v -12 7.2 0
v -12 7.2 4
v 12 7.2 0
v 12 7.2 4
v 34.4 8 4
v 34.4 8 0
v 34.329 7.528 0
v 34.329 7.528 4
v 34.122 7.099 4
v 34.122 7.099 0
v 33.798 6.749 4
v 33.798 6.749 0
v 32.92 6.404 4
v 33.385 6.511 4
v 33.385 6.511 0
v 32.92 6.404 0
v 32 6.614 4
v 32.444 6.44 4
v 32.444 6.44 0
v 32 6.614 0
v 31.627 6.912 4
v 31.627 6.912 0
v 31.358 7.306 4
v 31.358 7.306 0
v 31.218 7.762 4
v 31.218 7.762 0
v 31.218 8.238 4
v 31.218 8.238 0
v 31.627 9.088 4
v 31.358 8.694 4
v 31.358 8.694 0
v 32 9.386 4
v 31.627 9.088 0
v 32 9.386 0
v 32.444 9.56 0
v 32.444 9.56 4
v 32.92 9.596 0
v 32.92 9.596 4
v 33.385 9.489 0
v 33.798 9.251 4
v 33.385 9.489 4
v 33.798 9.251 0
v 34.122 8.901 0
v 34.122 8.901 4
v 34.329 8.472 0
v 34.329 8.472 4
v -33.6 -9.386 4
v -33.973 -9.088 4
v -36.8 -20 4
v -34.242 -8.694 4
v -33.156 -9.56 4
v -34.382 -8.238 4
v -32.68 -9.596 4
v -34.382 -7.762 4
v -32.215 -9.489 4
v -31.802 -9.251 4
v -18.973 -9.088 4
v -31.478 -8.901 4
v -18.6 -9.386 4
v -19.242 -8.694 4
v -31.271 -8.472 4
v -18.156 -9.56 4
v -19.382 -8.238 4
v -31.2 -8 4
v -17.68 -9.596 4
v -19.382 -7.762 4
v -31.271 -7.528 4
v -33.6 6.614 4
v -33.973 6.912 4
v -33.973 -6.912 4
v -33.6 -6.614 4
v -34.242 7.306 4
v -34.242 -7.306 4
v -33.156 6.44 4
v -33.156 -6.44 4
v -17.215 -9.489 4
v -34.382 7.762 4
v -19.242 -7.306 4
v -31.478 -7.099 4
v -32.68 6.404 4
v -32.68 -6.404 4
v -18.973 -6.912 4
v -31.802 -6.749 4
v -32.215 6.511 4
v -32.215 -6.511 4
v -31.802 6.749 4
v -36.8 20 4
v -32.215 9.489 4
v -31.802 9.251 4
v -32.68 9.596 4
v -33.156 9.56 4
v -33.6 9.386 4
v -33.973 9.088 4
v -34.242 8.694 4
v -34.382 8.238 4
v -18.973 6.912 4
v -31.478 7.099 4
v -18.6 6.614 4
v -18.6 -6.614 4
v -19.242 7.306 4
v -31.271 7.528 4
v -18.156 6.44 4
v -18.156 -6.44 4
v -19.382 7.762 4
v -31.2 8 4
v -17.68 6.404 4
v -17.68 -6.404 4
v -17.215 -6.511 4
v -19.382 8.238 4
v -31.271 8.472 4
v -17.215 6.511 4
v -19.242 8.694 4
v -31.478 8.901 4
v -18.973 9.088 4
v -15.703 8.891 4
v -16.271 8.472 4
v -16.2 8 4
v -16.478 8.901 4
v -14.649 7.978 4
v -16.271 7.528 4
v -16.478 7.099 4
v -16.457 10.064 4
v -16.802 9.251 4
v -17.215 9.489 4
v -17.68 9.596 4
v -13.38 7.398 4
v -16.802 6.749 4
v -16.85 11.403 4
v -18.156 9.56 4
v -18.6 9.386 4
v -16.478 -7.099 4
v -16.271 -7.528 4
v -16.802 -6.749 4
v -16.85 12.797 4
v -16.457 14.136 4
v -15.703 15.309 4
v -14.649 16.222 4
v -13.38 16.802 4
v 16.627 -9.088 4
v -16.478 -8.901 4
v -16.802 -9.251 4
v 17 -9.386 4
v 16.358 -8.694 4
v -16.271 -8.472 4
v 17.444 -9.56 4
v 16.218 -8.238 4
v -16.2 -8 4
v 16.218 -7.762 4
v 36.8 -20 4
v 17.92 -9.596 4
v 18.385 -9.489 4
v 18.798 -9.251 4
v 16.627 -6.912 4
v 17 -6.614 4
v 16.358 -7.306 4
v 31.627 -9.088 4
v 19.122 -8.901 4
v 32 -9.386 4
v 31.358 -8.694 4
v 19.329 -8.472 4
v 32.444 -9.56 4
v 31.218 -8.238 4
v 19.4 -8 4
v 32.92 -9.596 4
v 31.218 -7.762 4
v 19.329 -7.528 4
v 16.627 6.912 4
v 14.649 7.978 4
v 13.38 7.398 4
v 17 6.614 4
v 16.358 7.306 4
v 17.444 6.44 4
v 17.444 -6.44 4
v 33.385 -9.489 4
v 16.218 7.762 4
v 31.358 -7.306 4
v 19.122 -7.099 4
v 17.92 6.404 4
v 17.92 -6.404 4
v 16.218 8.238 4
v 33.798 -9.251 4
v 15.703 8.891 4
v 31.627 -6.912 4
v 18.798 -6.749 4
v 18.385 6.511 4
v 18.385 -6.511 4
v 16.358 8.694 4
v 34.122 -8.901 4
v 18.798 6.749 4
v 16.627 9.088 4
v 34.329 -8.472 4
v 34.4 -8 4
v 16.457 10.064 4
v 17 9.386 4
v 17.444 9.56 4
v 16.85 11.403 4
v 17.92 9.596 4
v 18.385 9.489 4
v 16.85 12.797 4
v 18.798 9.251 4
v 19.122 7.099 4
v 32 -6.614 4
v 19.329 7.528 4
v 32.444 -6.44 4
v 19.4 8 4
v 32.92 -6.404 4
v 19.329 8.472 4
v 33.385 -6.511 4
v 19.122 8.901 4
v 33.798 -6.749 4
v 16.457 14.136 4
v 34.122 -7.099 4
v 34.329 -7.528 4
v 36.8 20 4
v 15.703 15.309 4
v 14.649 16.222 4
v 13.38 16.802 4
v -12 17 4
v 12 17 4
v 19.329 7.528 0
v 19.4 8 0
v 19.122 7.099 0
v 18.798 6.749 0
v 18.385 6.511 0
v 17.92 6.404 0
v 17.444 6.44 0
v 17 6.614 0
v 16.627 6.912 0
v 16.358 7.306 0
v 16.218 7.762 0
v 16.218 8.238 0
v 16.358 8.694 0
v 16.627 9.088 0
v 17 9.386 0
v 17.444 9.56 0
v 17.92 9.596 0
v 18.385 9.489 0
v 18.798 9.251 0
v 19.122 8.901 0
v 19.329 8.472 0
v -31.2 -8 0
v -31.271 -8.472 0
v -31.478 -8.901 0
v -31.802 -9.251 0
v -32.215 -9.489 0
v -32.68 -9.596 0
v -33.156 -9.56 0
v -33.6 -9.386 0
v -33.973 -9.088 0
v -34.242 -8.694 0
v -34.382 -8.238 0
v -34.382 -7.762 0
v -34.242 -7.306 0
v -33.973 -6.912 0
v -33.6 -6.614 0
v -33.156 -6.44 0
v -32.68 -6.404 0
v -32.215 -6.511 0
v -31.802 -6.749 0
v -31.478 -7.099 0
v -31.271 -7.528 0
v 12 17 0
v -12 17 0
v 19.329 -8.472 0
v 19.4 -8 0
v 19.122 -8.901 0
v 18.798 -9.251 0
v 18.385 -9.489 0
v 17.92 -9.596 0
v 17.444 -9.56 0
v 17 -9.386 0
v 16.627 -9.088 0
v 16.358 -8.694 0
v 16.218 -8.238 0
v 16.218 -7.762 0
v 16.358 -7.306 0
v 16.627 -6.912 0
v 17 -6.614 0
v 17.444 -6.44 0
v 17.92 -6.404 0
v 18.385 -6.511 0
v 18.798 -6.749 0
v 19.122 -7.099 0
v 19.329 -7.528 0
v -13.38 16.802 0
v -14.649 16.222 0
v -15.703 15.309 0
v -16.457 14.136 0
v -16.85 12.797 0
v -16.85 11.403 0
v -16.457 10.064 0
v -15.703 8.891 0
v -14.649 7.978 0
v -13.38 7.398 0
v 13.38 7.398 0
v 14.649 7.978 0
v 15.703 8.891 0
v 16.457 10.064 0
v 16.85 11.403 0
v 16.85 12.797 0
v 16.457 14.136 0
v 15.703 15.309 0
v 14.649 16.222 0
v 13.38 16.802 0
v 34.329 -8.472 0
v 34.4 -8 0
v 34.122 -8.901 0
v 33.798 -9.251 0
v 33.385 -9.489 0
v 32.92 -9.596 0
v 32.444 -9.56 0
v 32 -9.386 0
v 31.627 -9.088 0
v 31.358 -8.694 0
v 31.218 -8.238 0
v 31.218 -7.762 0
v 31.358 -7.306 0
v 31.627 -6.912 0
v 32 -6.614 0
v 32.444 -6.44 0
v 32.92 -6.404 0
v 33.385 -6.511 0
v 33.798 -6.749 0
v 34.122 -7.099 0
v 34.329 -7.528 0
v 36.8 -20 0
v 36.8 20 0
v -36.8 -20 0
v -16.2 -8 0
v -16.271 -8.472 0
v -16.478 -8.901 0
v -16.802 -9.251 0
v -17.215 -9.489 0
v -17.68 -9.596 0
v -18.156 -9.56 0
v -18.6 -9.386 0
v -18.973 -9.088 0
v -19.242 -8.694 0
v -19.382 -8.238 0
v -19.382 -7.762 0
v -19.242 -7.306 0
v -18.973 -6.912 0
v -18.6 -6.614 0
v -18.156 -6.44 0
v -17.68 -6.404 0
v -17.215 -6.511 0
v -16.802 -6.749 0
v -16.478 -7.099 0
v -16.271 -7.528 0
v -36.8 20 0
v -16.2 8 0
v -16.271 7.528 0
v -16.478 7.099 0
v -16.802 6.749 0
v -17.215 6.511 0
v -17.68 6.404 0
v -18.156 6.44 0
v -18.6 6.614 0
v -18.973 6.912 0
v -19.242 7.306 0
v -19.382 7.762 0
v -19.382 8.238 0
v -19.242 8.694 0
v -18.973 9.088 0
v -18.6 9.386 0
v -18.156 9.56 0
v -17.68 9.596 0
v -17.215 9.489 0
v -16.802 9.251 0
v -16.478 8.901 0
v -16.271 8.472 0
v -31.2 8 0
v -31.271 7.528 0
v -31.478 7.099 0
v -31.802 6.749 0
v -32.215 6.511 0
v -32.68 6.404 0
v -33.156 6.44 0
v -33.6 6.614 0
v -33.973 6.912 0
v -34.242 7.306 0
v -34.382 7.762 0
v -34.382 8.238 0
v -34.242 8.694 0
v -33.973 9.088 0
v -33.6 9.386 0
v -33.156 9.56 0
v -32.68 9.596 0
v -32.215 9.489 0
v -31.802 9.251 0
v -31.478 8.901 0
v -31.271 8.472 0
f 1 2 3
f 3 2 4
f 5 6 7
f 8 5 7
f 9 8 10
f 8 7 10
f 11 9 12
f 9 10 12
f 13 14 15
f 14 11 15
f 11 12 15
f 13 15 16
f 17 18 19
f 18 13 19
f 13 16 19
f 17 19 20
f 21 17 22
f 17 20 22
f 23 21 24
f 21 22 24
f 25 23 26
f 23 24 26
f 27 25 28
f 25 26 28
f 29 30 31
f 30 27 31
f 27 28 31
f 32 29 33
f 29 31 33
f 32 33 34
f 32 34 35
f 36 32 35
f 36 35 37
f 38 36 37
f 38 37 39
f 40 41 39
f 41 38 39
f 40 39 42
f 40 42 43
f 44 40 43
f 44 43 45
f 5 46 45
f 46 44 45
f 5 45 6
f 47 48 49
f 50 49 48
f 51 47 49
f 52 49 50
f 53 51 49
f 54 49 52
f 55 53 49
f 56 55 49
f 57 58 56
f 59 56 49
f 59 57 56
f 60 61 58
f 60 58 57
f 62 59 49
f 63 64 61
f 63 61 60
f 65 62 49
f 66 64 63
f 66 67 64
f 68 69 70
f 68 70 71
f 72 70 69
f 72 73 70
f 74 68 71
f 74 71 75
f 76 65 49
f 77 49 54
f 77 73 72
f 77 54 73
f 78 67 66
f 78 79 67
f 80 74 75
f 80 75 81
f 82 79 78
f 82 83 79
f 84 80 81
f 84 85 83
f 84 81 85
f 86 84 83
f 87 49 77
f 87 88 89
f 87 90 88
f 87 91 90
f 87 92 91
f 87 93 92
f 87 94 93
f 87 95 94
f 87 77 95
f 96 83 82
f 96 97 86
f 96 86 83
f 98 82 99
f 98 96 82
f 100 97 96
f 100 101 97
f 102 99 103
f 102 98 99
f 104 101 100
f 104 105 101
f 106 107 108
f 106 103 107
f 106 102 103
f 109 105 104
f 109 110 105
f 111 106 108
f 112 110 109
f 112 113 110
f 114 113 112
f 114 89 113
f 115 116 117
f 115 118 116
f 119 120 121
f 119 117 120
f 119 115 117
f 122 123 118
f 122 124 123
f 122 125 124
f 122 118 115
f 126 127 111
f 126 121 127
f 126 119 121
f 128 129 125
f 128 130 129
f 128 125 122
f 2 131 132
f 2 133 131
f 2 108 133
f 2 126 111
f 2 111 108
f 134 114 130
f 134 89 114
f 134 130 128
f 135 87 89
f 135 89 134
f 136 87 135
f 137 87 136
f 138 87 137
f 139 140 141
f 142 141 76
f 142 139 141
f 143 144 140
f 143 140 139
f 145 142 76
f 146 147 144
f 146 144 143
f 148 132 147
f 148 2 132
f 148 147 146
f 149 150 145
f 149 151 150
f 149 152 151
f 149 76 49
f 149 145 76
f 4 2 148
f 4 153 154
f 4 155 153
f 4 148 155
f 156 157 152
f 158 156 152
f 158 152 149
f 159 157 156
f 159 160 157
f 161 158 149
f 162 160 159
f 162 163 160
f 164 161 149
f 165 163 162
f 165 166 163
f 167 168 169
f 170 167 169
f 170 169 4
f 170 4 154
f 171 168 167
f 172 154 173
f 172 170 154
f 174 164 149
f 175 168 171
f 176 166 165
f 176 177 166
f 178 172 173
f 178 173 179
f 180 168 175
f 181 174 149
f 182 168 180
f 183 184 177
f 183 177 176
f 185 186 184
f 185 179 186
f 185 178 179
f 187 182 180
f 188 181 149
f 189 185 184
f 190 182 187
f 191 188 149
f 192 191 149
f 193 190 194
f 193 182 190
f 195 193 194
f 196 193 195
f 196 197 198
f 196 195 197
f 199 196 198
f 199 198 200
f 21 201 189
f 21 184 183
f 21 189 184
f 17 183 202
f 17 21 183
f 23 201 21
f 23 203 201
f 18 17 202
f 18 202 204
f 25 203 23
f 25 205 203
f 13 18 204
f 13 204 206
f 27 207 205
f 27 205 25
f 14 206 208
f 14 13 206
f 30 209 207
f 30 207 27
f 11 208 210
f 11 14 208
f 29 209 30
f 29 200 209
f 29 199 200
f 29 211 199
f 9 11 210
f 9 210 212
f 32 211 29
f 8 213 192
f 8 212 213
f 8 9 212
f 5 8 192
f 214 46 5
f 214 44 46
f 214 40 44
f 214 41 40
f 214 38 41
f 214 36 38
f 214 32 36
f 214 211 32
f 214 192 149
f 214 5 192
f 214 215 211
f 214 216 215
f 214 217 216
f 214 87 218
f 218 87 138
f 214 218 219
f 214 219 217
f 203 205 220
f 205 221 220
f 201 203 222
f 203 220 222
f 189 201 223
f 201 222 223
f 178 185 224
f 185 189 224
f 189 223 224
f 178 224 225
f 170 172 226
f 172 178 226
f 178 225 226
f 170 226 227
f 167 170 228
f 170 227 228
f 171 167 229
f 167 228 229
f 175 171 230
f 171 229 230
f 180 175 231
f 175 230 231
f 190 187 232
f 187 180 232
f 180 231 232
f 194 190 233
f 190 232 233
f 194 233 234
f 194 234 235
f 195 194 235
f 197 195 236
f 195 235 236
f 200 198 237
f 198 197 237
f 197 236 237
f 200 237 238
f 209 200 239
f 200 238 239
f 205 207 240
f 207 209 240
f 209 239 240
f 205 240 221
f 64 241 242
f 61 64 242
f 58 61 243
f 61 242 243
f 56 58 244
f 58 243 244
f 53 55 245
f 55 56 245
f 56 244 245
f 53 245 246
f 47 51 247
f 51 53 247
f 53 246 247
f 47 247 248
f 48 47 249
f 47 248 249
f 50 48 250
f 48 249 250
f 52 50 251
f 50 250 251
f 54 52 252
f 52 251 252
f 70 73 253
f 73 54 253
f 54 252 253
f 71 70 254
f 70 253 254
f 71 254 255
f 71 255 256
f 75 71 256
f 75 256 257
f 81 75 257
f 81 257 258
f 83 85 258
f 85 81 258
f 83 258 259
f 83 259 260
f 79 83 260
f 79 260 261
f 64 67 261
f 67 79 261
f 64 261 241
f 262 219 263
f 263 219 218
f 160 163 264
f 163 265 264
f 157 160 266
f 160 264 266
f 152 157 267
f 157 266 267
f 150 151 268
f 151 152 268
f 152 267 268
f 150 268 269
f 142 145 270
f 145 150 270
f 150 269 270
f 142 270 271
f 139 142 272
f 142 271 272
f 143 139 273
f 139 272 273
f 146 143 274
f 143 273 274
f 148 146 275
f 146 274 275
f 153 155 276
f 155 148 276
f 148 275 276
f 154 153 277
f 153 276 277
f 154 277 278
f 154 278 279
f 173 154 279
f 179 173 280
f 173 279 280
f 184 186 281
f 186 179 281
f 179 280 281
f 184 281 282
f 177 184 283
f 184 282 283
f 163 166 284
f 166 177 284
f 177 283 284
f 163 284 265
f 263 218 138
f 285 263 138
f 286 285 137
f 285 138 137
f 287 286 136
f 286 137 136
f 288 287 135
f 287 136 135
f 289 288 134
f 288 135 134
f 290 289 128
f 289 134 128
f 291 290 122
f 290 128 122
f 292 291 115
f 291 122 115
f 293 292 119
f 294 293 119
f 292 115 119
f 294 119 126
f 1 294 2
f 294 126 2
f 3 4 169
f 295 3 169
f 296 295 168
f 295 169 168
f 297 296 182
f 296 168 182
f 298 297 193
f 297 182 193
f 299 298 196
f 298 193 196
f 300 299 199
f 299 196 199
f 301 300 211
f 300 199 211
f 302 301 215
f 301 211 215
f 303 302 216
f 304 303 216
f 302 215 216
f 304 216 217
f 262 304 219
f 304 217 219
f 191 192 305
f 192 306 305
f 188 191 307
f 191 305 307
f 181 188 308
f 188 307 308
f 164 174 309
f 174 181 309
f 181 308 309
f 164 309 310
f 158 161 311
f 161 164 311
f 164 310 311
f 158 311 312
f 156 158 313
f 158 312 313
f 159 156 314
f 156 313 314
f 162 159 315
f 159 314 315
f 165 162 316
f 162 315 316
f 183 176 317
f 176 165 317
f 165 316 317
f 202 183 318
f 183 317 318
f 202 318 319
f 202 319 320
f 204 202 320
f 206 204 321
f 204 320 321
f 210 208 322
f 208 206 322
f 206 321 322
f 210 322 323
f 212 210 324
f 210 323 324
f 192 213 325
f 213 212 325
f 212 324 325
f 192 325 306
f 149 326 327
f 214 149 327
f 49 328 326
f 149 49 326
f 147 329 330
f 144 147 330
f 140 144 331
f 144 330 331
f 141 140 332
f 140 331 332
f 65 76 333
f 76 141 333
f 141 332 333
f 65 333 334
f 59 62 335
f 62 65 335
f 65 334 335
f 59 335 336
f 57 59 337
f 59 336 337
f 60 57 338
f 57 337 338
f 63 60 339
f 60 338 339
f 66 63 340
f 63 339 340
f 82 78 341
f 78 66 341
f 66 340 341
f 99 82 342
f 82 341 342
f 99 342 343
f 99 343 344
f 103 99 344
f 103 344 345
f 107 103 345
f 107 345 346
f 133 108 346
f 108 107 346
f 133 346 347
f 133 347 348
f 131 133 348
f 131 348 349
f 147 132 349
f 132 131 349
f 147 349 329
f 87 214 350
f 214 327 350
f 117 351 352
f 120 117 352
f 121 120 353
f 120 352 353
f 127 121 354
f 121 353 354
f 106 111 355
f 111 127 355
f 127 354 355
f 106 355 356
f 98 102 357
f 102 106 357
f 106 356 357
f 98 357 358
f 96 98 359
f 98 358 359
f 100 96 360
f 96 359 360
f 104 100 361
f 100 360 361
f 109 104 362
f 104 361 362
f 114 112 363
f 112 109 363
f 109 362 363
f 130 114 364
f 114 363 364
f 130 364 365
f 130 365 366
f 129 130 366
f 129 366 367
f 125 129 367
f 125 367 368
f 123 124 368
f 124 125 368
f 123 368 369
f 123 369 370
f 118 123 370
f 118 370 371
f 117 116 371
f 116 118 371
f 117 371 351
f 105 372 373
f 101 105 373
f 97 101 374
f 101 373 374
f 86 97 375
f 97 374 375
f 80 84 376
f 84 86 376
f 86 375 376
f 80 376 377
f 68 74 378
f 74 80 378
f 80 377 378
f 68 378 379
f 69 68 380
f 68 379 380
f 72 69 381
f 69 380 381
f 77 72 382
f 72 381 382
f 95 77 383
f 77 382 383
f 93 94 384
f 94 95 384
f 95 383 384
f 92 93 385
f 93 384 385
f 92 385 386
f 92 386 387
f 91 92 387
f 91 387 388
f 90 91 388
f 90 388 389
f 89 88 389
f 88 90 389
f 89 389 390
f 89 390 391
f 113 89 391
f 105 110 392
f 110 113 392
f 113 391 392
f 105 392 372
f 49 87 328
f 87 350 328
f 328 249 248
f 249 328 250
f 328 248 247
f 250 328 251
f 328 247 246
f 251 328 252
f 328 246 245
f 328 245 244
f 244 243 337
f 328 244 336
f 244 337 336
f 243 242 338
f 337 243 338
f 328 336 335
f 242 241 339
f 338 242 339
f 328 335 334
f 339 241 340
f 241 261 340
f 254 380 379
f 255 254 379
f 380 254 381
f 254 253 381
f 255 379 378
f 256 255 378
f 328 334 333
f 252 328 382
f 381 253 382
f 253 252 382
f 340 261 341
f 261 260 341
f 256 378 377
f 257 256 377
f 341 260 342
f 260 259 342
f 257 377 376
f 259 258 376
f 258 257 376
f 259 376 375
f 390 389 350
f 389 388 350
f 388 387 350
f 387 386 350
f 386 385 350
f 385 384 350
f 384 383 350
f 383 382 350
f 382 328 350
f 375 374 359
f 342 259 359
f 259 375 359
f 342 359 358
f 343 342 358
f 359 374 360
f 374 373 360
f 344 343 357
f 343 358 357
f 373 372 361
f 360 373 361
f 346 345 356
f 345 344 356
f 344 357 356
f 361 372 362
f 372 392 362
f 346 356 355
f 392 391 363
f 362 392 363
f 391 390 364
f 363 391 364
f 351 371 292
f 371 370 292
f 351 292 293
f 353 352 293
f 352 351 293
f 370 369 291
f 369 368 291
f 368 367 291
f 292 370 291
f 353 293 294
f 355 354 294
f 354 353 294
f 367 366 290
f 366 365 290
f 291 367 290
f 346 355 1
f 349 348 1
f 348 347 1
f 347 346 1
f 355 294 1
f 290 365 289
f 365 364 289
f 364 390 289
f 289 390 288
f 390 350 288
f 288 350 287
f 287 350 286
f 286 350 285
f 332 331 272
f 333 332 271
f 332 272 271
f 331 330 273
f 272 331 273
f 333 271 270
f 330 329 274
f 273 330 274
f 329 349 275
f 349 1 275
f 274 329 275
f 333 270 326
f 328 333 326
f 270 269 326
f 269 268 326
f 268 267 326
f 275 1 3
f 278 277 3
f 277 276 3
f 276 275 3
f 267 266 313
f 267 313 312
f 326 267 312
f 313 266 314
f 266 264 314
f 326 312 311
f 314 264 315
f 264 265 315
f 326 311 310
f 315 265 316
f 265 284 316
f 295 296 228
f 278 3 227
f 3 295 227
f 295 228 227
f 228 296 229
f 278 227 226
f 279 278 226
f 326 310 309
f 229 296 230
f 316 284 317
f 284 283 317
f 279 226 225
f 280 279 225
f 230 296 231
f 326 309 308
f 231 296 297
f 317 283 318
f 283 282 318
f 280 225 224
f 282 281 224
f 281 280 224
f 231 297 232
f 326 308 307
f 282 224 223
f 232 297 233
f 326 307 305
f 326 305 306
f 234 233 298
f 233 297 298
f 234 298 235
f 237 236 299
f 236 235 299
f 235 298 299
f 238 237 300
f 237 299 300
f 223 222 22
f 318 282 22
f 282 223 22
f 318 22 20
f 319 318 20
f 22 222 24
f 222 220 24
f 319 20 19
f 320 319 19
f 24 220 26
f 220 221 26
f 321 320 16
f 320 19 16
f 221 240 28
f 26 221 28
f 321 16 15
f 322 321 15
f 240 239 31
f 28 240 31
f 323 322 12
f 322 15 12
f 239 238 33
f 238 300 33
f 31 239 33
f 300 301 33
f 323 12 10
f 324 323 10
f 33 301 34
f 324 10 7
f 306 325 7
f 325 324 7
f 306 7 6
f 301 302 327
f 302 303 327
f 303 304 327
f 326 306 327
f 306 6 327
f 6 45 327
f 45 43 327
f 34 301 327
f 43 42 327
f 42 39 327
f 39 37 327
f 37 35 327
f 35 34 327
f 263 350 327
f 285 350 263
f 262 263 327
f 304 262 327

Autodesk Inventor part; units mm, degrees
ref_plane "YZ Plane" through (0, 0, 0) normal (1, 0, 0) x (0, 1, 0)
ref_plane "XZ Plane" through (0, 0, 0) normal (0, 1, 0) x (-1, 0, 0)
ref_plane "XY Plane" through (0, 0, 0) normal (0, 0, 1) x (1, 0, 0)
sketch "Эскиз1" plane through (0, 0, 0) normal (0, 0, 1) x (1, 0, 0)
  line L0 (-36.8, -20) -> (36.8, -20)
  line L1 (36.8, -20) -> (36.8, 20)
  line L2 (36.8, 20) -> (-36.8, 20)
  line L3 (-36.8, 20) -> (-36.8, -20)
  line L4 (-36.8, -20) -> (36.8, 20) construction
  line L5 (36.8, -20) -> (-36.8, 20) construction
  line L6 (-17.8, -8) -> (-32.8, -8) construction
  line L7 (-32.8, -8) -> (-32.8, 8) construction
  line L8 (-32.8, 8) -> (-17.8, 8) construction
  line L9 (-17.8, 8) -> (-17.8, -8) construction
  line L10 (-17.8, -8) -> (-32.8, 8) construction
  line L11 (-32.8, -8) -> (-17.8, 8) construction
  circle A0 centre (-32.8, -8) radius 1.6
  circle A1 centre (-32.8, 8) radius 1.6
  circle A2 centre (-17.8, 8) radius 1.6
  circle A3 centre (-17.8, -8) radius 1.6
  line L12 (0, 0) -> (0, -20) construction
  line L13 (17.8, -8) -> (32.8, -8) construction
  line L14 (32.8, -8) -> (32.8, 8) construction
  line L15 (32.8, 8) -> (17.8, 8) construction
  line L16 (17.8, 8) -> (17.8, -8) construction
  line L17 (17.8, -8) -> (32.8, 8) construction
  line L18 (32.8, -8) -> (17.8, 8) construction
  circle A4 centre (32.8, -8) radius 1.6
  circle A5 centre (32.8, 8) radius 1.6
  circle A6 centre (17.8, 8) radius 1.6
  circle A7 centre (17.8, -8) radius 1.6
  point P0 (-25.3, 0)
  point P1 (25.3, 0)
  dimension "d0" = 73.6
  dimension "d1" = 40
  dimension "d2" = 15
  dimension "d3" = 16
  dimension "d4" = 4
  dimension "d5" = 3.2
  dimension "d6" = 3.2
  dimension "d7" = 3.2
  dimension "d8" = 3.2
  dimension "d9" = 20
extrude "Выдавливание1" add sketch "Эскиз1" along normal blind 4
sketch "Эскиз2" plane through (0, 0, 4) normal (0, 0, 1) x (1, 0, 0)
  line L0 (-12, 12.1) -> (12, 12.1) construction
  line L1 (-12, 7.2) -> (12, 7.2)
  line L2 (12, 17) -> (-12, 17)
  arc A0 (-12, 17) -> (-12, 7.2) centre (-12, 12.1) ccw
  arc A1 (12, 7.2) -> (12, 17) centre (12, 12.1) ccw
  line L3 (36.8, 20) -> (-36.8, 20) projected
  point P0 (0, 0)
  point P1 (0, 12.1)
  dimension "d12" = 12
  dimension "d13" = 9.8
  dimension "d14" = 3
extrude "Выдавливание2" cut sketch "Эскиз2" against normal blind 10
properties part number "стена_движения_каретки_з"
